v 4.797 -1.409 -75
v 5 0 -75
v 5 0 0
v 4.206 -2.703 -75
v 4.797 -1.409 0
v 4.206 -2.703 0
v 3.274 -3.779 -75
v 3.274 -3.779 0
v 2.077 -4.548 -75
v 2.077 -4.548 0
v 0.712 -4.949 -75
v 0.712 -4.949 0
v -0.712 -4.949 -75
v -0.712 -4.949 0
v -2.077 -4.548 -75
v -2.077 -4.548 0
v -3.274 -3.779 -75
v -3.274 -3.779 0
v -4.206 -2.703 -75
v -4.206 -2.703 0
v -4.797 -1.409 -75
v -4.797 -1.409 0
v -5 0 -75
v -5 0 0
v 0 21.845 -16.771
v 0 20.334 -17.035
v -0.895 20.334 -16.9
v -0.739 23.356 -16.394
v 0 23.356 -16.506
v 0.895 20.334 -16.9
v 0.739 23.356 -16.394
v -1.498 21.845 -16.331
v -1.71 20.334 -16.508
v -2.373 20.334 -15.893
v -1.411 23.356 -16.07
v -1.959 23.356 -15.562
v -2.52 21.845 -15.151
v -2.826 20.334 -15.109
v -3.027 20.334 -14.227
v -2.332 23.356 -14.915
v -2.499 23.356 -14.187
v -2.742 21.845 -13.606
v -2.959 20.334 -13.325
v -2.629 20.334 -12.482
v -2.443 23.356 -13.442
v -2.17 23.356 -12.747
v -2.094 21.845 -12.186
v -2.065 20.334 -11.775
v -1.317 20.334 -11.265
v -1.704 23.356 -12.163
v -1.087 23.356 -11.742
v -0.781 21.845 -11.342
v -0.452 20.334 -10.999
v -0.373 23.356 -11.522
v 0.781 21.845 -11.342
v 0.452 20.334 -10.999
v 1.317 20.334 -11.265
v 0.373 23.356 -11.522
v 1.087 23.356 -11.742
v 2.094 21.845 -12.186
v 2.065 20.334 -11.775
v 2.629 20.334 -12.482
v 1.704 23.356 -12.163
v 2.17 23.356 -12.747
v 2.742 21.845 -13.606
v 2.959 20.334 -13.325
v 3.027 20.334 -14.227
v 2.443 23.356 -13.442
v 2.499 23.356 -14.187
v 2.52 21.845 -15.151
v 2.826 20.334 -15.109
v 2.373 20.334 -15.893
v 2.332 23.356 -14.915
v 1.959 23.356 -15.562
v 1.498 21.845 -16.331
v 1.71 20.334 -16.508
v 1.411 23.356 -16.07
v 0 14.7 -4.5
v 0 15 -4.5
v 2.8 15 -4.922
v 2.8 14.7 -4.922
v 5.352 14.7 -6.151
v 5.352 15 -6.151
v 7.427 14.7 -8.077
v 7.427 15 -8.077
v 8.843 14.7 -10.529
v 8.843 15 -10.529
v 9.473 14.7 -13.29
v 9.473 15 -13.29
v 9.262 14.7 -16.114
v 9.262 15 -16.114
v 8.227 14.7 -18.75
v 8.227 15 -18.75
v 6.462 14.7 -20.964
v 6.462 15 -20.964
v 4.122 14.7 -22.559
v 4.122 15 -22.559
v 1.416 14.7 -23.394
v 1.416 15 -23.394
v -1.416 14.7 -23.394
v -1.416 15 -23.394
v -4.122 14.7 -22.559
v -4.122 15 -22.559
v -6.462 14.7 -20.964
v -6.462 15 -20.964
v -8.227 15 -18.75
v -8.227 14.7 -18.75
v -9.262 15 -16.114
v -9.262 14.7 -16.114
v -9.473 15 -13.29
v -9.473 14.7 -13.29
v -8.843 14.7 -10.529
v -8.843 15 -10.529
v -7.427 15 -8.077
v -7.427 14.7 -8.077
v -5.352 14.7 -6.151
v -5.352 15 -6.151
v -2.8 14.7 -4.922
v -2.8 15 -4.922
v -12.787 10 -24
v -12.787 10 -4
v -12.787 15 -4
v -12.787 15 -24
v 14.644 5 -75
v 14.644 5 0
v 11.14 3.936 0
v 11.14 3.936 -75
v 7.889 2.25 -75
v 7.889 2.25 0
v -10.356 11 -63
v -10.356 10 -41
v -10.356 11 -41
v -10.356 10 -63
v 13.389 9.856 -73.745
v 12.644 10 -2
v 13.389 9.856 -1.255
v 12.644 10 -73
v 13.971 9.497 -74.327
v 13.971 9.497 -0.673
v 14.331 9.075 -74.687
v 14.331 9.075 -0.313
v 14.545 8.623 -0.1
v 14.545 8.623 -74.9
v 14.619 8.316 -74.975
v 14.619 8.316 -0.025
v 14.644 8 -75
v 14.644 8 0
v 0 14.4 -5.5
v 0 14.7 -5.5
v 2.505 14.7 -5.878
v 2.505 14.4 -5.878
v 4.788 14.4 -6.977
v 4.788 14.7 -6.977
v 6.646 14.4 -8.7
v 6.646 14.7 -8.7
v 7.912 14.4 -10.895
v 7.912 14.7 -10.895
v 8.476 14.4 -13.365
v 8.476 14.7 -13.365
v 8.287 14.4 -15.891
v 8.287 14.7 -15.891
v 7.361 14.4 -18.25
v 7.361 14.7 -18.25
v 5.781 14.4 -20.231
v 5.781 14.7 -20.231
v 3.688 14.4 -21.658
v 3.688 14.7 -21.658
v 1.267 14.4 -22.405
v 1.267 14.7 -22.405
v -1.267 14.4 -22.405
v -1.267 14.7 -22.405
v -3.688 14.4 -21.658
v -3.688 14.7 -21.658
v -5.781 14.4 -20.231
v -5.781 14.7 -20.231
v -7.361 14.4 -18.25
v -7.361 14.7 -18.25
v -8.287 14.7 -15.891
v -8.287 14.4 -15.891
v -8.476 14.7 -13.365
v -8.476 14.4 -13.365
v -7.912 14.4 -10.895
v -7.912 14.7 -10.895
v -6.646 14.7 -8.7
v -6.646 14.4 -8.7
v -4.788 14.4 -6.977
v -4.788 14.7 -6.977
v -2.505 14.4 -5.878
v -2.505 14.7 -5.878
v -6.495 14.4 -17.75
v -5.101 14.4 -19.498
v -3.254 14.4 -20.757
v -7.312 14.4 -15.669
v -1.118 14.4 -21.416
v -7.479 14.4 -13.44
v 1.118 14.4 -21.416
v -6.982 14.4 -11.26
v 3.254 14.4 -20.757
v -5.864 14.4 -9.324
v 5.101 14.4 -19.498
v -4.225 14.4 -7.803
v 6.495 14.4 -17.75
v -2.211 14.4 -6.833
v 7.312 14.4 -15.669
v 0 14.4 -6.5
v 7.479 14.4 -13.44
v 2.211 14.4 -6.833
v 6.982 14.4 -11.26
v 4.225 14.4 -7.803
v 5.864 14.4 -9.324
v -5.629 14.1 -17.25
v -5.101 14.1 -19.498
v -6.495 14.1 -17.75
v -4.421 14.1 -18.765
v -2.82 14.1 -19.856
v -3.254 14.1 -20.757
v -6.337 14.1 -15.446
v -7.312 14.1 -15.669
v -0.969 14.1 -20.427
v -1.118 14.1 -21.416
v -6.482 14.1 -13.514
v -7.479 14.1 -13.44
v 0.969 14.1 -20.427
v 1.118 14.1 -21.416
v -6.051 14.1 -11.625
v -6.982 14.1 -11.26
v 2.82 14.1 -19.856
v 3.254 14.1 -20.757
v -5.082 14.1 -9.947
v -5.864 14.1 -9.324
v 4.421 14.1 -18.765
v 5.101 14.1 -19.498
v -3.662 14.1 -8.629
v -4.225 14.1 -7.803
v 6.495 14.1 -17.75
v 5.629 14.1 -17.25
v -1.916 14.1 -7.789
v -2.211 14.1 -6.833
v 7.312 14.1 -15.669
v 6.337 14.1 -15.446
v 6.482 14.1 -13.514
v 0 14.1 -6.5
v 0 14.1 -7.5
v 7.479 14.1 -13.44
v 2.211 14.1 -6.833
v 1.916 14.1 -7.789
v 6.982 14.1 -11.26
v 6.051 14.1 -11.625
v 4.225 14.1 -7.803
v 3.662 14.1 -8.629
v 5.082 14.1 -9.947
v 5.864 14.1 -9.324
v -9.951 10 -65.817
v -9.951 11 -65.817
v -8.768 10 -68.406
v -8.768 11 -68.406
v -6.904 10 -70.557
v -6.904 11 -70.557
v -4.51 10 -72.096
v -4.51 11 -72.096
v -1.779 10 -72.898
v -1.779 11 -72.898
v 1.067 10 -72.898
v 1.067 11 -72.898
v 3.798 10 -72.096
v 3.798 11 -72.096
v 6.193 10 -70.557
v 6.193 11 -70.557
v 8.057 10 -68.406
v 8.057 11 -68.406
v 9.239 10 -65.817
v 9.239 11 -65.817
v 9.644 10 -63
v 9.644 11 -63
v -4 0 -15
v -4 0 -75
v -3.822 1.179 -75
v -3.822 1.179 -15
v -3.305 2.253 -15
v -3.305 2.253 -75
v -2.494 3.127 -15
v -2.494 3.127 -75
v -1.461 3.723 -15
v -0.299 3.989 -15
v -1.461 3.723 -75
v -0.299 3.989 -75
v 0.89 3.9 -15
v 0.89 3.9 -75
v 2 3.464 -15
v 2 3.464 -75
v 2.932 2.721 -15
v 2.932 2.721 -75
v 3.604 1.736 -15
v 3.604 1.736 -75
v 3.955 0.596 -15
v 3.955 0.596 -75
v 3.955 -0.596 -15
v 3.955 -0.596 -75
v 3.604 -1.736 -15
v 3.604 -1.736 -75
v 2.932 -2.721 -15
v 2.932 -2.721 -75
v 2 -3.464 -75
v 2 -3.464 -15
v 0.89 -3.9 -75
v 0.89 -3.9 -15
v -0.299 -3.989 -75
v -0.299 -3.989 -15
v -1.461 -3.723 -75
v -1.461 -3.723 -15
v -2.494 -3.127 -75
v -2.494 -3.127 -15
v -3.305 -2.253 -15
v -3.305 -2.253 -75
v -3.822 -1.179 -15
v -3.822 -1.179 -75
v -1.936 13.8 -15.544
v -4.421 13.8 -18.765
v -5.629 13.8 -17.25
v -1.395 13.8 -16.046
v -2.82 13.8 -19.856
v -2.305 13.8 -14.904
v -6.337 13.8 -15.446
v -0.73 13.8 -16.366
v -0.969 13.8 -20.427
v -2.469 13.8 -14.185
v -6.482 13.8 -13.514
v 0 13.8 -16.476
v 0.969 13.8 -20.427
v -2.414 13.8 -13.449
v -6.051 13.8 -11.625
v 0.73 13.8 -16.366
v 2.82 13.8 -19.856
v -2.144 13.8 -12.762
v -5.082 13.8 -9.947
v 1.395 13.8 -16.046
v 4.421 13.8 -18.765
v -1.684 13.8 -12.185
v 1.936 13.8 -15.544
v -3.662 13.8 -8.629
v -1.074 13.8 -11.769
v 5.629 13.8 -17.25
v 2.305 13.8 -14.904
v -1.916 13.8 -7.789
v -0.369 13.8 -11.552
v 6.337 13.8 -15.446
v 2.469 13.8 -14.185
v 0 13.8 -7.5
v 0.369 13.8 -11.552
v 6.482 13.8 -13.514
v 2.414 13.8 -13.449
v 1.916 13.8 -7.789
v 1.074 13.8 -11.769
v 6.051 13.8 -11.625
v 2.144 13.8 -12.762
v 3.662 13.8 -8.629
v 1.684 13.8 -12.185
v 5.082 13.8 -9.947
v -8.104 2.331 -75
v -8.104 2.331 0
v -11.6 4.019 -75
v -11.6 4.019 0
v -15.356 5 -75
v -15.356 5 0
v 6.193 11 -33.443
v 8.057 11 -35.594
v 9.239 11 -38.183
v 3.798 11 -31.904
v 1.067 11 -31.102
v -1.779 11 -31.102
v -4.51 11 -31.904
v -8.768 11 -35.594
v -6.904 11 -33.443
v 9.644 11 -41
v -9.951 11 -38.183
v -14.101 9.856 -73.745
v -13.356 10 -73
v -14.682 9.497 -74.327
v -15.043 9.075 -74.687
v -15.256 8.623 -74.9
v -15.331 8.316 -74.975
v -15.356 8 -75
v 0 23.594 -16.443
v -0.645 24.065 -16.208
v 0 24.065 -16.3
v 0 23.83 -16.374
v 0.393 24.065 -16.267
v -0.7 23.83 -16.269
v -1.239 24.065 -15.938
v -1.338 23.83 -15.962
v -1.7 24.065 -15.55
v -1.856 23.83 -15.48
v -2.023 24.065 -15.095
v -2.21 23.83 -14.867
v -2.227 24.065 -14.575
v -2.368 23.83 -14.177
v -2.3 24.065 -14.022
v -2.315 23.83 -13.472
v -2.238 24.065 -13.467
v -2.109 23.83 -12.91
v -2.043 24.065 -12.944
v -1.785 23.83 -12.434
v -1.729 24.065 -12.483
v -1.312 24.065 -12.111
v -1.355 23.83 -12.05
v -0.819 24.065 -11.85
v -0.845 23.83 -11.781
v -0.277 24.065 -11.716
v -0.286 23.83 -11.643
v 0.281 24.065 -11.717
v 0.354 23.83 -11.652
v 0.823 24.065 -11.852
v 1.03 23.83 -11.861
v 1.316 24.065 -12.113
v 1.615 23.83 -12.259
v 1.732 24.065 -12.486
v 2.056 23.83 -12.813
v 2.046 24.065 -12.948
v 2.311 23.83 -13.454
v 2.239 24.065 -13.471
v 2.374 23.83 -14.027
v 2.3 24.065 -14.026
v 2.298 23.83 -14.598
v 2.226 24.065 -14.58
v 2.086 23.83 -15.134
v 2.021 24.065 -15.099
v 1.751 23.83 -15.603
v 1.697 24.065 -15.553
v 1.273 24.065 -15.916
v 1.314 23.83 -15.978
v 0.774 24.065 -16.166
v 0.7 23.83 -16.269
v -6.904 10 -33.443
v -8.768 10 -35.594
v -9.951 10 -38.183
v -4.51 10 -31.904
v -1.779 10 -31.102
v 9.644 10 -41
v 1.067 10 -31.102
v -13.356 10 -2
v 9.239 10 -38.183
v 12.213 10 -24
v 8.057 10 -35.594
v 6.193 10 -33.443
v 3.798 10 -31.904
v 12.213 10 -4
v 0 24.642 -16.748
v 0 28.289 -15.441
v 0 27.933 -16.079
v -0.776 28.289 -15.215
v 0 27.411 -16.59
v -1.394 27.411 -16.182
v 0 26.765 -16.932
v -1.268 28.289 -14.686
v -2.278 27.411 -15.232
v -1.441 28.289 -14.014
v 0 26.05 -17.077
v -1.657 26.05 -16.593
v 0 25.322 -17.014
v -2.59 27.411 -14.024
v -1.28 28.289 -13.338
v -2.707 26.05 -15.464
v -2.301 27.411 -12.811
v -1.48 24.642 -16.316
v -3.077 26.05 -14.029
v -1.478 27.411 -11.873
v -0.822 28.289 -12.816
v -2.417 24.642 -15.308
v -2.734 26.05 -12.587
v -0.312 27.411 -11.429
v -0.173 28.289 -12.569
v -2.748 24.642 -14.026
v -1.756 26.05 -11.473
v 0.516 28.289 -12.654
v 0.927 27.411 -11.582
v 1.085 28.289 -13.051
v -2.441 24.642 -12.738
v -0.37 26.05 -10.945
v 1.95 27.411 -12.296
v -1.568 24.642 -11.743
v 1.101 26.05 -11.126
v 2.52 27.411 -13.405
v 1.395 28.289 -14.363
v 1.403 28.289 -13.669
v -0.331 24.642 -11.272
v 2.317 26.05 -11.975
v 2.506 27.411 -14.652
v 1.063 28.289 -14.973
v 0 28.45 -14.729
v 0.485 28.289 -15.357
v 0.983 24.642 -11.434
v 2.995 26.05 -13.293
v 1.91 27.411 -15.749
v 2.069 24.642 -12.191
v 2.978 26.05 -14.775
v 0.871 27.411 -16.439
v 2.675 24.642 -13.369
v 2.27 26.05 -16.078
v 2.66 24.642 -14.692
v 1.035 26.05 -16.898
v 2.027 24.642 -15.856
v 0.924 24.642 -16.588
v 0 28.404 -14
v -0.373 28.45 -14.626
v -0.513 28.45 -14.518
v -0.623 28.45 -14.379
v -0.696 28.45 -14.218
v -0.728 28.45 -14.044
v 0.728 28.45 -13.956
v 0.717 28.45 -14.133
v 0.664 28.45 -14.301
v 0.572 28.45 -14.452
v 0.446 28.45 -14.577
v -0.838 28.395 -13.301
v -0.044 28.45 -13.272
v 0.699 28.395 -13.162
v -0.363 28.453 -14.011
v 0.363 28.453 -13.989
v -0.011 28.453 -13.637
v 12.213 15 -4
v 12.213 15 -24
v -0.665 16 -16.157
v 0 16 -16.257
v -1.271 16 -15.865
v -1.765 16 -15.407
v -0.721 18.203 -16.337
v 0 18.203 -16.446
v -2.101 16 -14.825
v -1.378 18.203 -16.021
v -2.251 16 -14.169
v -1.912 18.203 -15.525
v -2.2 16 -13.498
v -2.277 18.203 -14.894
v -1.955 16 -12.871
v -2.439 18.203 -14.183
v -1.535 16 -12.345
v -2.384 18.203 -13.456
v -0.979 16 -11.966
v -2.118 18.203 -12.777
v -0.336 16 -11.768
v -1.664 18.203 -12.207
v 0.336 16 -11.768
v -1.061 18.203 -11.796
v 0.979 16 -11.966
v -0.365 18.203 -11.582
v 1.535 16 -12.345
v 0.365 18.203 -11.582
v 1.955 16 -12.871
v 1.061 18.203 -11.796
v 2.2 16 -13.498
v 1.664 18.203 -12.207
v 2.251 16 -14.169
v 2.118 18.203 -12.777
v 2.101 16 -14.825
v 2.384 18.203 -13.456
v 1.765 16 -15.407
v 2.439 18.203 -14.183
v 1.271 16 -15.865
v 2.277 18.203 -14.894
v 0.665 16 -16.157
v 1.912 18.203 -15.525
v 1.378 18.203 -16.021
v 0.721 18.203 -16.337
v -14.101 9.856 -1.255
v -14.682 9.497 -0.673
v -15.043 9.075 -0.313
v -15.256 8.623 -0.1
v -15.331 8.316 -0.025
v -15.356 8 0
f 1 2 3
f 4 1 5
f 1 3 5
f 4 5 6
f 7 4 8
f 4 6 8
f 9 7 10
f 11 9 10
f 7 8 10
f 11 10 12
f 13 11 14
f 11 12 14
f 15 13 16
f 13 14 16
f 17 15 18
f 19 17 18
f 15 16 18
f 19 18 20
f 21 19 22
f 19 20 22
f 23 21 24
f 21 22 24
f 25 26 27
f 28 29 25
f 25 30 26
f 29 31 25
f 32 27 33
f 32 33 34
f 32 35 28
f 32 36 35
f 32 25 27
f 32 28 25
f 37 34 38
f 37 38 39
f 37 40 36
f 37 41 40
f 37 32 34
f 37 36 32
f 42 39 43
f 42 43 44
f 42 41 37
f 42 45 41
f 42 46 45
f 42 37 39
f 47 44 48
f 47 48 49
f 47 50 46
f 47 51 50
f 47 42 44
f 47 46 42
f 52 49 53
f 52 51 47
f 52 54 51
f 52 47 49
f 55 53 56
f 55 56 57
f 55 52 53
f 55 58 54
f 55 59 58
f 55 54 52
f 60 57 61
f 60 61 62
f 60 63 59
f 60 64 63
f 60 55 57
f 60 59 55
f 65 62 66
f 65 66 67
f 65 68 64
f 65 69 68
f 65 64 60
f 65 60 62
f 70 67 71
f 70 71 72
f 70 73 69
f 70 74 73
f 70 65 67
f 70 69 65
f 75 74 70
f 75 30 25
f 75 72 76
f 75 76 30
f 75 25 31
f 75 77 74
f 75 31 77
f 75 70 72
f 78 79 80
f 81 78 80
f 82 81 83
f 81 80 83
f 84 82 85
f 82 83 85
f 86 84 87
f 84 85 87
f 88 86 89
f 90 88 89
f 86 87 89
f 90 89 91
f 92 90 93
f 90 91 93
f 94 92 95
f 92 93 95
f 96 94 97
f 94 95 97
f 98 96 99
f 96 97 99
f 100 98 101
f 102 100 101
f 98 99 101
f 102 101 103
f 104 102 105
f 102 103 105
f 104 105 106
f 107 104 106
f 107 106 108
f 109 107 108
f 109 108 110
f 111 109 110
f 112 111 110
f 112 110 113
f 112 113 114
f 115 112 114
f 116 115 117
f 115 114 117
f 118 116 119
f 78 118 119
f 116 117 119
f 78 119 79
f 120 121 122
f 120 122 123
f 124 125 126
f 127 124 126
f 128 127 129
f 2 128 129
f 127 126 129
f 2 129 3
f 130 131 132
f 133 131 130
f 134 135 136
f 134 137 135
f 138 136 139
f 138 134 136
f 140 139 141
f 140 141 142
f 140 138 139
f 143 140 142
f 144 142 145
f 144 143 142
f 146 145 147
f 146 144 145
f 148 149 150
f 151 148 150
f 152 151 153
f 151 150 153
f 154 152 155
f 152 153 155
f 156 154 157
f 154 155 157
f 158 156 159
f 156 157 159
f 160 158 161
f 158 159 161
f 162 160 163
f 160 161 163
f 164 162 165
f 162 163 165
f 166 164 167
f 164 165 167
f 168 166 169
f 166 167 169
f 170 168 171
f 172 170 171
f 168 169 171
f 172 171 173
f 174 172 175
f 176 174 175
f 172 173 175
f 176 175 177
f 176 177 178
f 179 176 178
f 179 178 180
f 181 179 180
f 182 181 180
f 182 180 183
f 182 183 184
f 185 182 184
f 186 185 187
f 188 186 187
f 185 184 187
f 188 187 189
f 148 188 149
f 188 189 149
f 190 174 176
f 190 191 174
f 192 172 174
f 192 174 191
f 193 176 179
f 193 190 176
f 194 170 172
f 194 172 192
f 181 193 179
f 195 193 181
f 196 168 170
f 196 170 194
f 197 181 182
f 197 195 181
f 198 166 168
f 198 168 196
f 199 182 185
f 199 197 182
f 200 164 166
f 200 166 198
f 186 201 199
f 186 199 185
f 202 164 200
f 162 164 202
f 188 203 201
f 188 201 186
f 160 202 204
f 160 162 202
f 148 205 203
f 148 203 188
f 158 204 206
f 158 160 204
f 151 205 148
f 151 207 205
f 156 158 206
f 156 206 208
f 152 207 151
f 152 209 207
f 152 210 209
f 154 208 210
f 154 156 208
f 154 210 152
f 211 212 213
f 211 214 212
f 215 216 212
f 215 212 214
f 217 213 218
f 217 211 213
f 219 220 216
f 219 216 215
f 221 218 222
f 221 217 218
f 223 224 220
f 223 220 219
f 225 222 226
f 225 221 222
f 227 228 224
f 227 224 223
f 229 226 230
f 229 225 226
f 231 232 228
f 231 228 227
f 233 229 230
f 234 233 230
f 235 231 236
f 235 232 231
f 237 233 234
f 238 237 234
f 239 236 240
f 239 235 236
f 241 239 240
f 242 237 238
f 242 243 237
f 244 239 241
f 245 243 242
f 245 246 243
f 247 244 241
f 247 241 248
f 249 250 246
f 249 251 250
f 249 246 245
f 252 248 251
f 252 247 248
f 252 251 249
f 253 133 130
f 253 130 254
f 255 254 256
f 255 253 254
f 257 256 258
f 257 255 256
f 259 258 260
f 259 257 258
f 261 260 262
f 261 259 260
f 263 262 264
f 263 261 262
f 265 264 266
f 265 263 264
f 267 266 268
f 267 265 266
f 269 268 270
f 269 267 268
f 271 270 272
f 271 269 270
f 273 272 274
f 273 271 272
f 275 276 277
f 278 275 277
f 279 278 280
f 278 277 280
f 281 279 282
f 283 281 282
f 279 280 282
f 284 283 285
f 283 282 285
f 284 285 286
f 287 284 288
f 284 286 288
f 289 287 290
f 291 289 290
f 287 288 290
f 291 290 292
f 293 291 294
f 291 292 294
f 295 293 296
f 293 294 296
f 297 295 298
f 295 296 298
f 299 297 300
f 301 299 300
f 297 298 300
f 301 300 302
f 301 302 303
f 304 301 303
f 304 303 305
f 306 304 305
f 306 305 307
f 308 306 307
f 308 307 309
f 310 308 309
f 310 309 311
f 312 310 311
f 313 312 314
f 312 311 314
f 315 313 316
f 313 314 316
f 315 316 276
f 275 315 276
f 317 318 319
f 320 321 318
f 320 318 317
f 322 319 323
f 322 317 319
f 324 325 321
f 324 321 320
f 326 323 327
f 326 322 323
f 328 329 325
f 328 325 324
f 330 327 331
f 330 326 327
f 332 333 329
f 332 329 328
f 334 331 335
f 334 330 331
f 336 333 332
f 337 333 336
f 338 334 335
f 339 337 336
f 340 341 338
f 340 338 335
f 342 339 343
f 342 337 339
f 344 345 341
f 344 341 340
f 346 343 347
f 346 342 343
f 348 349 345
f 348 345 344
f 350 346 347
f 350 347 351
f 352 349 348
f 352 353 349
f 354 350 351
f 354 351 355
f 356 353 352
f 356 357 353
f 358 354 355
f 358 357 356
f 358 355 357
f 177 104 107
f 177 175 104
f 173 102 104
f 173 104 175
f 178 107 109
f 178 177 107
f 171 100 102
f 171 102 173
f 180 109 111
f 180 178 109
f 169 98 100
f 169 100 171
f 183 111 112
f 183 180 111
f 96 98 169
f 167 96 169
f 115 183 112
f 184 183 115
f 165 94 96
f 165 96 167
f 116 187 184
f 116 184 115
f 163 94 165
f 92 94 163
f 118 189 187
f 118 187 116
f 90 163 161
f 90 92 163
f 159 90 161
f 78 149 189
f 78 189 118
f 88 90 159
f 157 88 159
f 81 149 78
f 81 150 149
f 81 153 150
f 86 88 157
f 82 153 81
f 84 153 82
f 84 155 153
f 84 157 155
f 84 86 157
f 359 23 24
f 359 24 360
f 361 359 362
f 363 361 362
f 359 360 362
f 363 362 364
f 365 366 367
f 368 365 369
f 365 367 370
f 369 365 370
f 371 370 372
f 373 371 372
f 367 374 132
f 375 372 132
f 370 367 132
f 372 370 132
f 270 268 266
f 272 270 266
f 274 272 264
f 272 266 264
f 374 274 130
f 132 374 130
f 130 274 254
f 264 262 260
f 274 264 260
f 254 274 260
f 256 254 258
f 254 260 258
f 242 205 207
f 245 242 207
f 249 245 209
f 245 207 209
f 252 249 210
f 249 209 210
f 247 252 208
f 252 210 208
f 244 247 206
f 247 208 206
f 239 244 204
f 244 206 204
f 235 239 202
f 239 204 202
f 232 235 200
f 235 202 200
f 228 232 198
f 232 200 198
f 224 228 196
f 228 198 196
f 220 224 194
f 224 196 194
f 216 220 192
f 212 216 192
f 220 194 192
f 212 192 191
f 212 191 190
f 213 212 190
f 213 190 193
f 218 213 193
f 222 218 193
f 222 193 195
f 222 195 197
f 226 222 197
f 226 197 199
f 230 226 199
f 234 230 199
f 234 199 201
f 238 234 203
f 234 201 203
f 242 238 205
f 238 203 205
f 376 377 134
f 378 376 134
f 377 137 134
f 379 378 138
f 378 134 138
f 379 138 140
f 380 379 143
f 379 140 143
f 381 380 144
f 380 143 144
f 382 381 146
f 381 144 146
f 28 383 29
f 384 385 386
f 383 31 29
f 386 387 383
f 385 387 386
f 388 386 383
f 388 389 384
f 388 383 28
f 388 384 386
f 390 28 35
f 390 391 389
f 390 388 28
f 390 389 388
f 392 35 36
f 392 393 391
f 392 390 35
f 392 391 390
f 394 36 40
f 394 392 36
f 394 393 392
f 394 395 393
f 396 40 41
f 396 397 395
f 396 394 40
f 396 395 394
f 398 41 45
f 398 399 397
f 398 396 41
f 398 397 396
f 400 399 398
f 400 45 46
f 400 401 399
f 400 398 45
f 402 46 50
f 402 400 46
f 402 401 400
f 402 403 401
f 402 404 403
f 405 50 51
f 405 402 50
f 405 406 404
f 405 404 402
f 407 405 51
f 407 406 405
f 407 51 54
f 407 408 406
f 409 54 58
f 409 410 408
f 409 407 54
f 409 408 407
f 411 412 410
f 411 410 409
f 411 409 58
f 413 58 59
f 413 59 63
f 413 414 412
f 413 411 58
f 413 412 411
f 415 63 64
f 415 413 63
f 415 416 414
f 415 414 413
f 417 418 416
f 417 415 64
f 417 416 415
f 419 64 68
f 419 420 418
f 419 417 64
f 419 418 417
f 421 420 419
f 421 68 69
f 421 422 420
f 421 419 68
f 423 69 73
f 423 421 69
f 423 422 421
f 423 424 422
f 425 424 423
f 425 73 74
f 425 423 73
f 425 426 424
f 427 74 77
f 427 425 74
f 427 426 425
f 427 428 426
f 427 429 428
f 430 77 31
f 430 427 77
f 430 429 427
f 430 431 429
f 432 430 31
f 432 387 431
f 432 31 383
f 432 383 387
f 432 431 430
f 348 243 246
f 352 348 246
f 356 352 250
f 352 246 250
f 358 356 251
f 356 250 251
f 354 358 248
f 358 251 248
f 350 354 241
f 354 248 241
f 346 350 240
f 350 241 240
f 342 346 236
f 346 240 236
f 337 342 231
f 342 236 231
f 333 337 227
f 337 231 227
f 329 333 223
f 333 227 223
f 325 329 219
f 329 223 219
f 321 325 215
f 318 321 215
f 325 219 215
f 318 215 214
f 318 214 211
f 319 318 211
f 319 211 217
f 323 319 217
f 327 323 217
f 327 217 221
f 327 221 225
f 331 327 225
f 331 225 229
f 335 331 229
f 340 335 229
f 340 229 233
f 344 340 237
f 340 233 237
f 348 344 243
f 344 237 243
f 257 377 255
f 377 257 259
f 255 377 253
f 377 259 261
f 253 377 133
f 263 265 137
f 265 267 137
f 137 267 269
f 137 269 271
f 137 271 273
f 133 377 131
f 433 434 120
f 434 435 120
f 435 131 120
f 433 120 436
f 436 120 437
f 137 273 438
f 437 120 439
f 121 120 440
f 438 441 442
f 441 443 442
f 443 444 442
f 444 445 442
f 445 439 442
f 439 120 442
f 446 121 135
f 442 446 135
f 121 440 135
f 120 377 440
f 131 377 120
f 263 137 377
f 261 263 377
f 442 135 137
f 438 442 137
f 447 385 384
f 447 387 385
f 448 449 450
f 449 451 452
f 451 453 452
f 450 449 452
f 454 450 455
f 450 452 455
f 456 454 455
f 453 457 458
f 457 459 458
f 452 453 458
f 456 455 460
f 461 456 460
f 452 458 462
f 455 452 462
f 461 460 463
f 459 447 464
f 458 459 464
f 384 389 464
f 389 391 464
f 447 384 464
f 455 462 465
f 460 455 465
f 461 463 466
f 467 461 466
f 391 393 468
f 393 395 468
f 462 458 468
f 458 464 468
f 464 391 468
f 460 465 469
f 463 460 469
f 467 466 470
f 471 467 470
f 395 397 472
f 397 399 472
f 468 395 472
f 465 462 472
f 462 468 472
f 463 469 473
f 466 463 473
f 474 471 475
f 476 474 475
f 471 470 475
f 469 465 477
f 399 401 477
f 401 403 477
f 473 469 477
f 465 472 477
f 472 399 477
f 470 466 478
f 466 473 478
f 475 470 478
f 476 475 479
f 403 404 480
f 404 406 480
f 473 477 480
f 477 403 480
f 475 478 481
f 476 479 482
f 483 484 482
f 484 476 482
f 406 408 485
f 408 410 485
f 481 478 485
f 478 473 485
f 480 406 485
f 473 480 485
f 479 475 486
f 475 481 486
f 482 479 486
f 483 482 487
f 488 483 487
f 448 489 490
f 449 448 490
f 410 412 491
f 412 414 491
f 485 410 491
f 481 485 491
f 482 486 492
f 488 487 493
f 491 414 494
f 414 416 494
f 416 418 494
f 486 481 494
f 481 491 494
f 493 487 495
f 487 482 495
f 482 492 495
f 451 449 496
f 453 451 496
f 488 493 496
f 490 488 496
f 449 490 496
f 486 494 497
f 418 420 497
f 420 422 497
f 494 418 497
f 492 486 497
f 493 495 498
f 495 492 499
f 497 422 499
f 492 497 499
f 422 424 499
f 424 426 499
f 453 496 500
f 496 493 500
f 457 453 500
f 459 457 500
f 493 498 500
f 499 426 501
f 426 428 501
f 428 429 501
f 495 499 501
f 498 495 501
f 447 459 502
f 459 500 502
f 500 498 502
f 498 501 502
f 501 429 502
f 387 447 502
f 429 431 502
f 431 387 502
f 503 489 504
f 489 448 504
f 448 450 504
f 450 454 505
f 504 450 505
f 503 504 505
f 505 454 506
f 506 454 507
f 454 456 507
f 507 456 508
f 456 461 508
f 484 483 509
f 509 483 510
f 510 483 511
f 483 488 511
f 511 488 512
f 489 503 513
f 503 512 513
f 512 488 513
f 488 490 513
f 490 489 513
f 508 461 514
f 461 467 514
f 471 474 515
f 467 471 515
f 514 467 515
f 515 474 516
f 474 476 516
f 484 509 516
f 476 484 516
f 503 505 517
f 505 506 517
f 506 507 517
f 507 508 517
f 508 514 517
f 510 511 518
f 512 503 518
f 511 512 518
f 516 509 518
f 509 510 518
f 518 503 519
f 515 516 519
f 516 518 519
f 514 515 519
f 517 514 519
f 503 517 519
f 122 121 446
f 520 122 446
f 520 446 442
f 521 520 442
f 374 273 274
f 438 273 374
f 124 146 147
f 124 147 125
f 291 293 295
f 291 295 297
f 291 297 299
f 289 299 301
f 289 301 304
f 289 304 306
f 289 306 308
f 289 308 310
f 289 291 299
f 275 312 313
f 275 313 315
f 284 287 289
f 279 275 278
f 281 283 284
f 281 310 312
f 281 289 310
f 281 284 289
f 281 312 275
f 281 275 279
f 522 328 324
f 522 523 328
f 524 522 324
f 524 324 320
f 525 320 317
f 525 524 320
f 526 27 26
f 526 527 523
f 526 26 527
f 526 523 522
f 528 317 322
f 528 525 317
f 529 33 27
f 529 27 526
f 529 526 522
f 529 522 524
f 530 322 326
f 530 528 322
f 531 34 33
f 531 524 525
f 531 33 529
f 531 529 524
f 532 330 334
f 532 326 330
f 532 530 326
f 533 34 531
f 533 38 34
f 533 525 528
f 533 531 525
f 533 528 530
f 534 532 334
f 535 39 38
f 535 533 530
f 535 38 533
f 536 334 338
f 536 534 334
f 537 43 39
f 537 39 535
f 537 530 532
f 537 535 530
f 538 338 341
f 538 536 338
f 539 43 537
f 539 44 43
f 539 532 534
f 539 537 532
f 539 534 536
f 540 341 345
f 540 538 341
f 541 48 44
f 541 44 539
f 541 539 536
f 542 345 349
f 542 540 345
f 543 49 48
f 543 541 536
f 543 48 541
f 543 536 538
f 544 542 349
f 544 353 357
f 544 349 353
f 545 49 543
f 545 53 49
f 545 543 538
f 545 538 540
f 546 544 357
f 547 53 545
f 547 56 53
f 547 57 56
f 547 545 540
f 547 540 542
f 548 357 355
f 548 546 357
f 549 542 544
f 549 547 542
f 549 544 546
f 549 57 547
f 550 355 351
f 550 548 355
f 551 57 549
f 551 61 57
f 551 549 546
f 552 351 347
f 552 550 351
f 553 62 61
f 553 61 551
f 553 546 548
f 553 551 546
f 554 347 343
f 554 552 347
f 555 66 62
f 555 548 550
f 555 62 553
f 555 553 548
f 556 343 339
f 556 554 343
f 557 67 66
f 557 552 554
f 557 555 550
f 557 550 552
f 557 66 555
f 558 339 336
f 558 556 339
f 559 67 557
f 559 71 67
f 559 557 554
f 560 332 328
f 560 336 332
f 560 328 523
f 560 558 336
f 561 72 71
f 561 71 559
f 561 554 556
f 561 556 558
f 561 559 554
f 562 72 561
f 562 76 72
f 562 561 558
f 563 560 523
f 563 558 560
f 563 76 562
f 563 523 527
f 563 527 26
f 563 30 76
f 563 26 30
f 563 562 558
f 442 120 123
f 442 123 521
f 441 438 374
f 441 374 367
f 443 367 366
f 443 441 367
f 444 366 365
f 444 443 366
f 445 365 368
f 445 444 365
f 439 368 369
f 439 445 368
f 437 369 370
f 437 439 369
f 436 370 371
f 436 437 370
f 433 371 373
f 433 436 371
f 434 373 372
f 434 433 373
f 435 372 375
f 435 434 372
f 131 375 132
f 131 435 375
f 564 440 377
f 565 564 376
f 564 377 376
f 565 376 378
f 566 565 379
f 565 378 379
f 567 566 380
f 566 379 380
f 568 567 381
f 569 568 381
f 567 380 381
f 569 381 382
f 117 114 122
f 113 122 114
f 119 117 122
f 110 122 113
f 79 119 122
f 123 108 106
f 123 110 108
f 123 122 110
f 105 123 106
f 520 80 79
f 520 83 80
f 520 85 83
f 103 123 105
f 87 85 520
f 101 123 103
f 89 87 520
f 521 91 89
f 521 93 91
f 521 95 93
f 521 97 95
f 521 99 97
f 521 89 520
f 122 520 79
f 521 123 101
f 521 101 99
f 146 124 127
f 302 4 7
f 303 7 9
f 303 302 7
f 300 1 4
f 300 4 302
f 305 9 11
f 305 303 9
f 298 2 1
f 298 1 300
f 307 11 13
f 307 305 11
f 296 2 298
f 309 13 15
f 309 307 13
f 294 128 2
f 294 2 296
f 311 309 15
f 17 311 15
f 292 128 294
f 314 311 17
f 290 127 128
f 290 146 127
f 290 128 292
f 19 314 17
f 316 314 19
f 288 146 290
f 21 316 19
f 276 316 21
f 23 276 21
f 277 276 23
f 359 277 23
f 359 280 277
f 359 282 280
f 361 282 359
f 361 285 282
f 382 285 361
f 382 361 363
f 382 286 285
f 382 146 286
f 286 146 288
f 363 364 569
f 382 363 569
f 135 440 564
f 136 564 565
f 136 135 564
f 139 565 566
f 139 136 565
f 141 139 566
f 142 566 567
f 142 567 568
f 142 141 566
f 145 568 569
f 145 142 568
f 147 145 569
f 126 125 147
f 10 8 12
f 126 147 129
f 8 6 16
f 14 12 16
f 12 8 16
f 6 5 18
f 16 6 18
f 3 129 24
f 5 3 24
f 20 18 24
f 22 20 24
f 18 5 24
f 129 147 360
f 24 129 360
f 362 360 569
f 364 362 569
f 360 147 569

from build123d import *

# Parameters (mm, degrees)
BOSS_EXTRUDE2_DEPTH = 75
SKETCH2_R           = 4
CUT_EXTRUDE1_DEPTH  = 60
BOSS_EXTRUDE3_DEPTH = 1
SKETCH4_W           = 25
SKETCH4_H           = 20
BOSS_EXTRUDE4_DEPTH = 5
SKETCH5_R           = 9.5
CUT_EXTRUDE5_DEPTH  = 0.3
SKETCH9_R           = 8.5
CUT_EXTRUDE6_DEPTH  = 0.3
SKETCH10_R          = 7.5
CUT_EXTRUDE7_DEPTH  = 0.3
SKETCH11_R          = 6.5
CUT_EXTRUDE8_DEPTH  = 0.3
FILLET1_R           = 2


with BuildPart() as part:
    # Sketch1 → Boss-Extrude2 (new body)
    with BuildSketch(Plane.XY):
        with BuildLine():
            Line((-15.355814747, 10), (14.644185253, 10))
            Line((14.644185253, 10), (14.644185253, 5))
            ThreePointArc((14.644185253, 5), (9.476114191, 3.167336025), (5, 0))
            ThreePointArc((5, 0), (0, -5), (-5, 0))
            ThreePointArc((-5, 0), (-9.810792775, 3.260354155), (-15.355814747, 5))
            Line((-15.355814747, 5), (-15.355814747, 10))
        make_face()
    extrude(amount=-BOSS_EXTRUDE2_DEPTH)

    # Sketch2 → Cut-Extrude1 (cut)
    with BuildSketch(Plane(origin=(0, 0, -75), x_dir=(-1, 0, 0), z_dir=(0, 0, -1))):
        Circle(SKETCH2_R)
    extrude(amount=-CUT_EXTRUDE1_DEPTH, mode=Mode.SUBTRACT)

    # Sketch3 → Boss-Extrude3 (add)
    with BuildSketch(Plane(origin=(0, 10, 0), x_dir=(1, 0, 0), z_dir=(0, 1, 0))):
        with BuildLine():
            Line((-10.355814747, 41), (-10.355814747, 63))
            ThreePointArc((-10.355814747, 63), (-0.355814747, 73), (9.644185253, 63))
            Line((9.644185253, 63), (9.644185253, 41))
            ThreePointArc((9.644185253, 41), (-0.355814747, 31), (-10.355814747, 41))
        make_face()
    extrude(amount=BOSS_EXTRUDE3_DEPTH)

    # Sketch4 → Boss-Extrude4 (add)
    with BuildSketch(Plane(origin=(0, 10, 0), x_dir=(1, 0, 0), z_dir=(0, 1, 0))):
        with Locations((-0.28655183, 14)):
            Rectangle(SKETCH4_W, SKETCH4_H)
    extrude(amount=BOSS_EXTRUDE4_DEPTH)

    # Sketch5 → Cut-Extrude5 (cut)
    with BuildSketch(Plane(origin=(0, 15, 0), x_dir=(1, 0, 0), z_dir=(0, 1, 0))):
        with Locations(Location((0, 14, 0), (0, 0, 270))):
            Circle(SKETCH5_R)
    extrude(amount=-CUT_EXTRUDE5_DEPTH, mode=Mode.SUBTRACT)

    # Sketch9 → Cut-Extrude6 (cut)
    with BuildSketch(Plane(origin=(0, 14.7, 0), x_dir=(1, 0, 0), z_dir=(0, 1, 0))):
        with Locations(Location((0, 14, 0), (0, 0, 270))):
            Circle(SKETCH9_R)
    extrude(amount=-CUT_EXTRUDE6_DEPTH, mode=Mode.SUBTRACT)

    # Sketch10 → Cut-Extrude7 (cut)
    with BuildSketch(Plane(origin=(0, 14.4, 0), x_dir=(1, 0, 0), z_dir=(0, 1, 0))):
        with Locations(Location((0, 14, 0), (0, 0, 270))):
            Circle(SKETCH10_R)
    extrude(amount=-CUT_EXTRUDE7_DEPTH, mode=Mode.SUBTRACT)

    # Sketch11 → Cut-Extrude8 (cut)
    with BuildSketch(Plane(origin=(0, 14.1, 0), x_dir=(1, 0, 0), z_dir=(0, 1, 0))):
        with Locations(Location((0, 14, 0), (0, 0, 270))):
            Circle(SKETCH11_R)
    extrude(amount=-CUT_EXTRUDE8_DEPTH, mode=Mode.SUBTRACT)

    # Sketch12 → Revolve2 (revolve)
    with BuildSketch(Plane(origin=(0, 0, 0), x_dir=(0, 0, -1), z_dir=(1, 0, 0)), mode=Mode.PRIVATE) as revolve2_sk:
        with BuildLine():
            Line((14, 15), (14, 13.677907374))
            Line((14, 13.677907374), (11.5, 13.677907374))
            ThreePointArc((11.5, 13.677907374), (11.70459363, 17.043778802), (10.964658523, 20.333679266))
            Line((10.964658523, 20.333679266), (11.494340347, 23.356462384))
            ThreePointArc((11.494340347, 23.356462384), (12.09773994, 25.084923792), (13, 26.677907374))
            Line((13, 26.677907374), (14, 26.677907374))
            Line((14, 26.677907374), (14, 15))
        make_face()
    revolve(revolve2_sk.sketch.rotate(Axis((0, 13.677907374, -14), (0, 1, 0)), 180), axis=Axis((0, 13.677907374, -14), (0, 1, 0)))

    # Sketch13 → Revolve3 (revolve)
    with BuildSketch(Plane(origin=(0, 0, 0), x_dir=(0, 0, -1), z_dir=(1, 0, 0))):
        with BuildLine():
            Line((14, 23.403548627), (14, 28.403548627))
            ThreePointArc((14, 28.403548627), (17.081597334, 25.903548627), (14, 23.403548627))
        make_face()
    revolve(axis=Axis((0, 23.403548627, -14), (0, 1, 0)))

    # Fillet1
    fillet1_edges = [part.edges().sort_by_distance(p)[0] for p in [
        (-15.355814747, 10, -37.5),
        (14.644185253, 10, -37.5),
        (-0.355814747, 10, 0),
        (-0.355814747, 10, -75),
    ]]
    fillet(fillet1_edges, radius=FILLET1_R - 0.0001)  # a hair under: the kernel refuses the full size


solid = part.part
